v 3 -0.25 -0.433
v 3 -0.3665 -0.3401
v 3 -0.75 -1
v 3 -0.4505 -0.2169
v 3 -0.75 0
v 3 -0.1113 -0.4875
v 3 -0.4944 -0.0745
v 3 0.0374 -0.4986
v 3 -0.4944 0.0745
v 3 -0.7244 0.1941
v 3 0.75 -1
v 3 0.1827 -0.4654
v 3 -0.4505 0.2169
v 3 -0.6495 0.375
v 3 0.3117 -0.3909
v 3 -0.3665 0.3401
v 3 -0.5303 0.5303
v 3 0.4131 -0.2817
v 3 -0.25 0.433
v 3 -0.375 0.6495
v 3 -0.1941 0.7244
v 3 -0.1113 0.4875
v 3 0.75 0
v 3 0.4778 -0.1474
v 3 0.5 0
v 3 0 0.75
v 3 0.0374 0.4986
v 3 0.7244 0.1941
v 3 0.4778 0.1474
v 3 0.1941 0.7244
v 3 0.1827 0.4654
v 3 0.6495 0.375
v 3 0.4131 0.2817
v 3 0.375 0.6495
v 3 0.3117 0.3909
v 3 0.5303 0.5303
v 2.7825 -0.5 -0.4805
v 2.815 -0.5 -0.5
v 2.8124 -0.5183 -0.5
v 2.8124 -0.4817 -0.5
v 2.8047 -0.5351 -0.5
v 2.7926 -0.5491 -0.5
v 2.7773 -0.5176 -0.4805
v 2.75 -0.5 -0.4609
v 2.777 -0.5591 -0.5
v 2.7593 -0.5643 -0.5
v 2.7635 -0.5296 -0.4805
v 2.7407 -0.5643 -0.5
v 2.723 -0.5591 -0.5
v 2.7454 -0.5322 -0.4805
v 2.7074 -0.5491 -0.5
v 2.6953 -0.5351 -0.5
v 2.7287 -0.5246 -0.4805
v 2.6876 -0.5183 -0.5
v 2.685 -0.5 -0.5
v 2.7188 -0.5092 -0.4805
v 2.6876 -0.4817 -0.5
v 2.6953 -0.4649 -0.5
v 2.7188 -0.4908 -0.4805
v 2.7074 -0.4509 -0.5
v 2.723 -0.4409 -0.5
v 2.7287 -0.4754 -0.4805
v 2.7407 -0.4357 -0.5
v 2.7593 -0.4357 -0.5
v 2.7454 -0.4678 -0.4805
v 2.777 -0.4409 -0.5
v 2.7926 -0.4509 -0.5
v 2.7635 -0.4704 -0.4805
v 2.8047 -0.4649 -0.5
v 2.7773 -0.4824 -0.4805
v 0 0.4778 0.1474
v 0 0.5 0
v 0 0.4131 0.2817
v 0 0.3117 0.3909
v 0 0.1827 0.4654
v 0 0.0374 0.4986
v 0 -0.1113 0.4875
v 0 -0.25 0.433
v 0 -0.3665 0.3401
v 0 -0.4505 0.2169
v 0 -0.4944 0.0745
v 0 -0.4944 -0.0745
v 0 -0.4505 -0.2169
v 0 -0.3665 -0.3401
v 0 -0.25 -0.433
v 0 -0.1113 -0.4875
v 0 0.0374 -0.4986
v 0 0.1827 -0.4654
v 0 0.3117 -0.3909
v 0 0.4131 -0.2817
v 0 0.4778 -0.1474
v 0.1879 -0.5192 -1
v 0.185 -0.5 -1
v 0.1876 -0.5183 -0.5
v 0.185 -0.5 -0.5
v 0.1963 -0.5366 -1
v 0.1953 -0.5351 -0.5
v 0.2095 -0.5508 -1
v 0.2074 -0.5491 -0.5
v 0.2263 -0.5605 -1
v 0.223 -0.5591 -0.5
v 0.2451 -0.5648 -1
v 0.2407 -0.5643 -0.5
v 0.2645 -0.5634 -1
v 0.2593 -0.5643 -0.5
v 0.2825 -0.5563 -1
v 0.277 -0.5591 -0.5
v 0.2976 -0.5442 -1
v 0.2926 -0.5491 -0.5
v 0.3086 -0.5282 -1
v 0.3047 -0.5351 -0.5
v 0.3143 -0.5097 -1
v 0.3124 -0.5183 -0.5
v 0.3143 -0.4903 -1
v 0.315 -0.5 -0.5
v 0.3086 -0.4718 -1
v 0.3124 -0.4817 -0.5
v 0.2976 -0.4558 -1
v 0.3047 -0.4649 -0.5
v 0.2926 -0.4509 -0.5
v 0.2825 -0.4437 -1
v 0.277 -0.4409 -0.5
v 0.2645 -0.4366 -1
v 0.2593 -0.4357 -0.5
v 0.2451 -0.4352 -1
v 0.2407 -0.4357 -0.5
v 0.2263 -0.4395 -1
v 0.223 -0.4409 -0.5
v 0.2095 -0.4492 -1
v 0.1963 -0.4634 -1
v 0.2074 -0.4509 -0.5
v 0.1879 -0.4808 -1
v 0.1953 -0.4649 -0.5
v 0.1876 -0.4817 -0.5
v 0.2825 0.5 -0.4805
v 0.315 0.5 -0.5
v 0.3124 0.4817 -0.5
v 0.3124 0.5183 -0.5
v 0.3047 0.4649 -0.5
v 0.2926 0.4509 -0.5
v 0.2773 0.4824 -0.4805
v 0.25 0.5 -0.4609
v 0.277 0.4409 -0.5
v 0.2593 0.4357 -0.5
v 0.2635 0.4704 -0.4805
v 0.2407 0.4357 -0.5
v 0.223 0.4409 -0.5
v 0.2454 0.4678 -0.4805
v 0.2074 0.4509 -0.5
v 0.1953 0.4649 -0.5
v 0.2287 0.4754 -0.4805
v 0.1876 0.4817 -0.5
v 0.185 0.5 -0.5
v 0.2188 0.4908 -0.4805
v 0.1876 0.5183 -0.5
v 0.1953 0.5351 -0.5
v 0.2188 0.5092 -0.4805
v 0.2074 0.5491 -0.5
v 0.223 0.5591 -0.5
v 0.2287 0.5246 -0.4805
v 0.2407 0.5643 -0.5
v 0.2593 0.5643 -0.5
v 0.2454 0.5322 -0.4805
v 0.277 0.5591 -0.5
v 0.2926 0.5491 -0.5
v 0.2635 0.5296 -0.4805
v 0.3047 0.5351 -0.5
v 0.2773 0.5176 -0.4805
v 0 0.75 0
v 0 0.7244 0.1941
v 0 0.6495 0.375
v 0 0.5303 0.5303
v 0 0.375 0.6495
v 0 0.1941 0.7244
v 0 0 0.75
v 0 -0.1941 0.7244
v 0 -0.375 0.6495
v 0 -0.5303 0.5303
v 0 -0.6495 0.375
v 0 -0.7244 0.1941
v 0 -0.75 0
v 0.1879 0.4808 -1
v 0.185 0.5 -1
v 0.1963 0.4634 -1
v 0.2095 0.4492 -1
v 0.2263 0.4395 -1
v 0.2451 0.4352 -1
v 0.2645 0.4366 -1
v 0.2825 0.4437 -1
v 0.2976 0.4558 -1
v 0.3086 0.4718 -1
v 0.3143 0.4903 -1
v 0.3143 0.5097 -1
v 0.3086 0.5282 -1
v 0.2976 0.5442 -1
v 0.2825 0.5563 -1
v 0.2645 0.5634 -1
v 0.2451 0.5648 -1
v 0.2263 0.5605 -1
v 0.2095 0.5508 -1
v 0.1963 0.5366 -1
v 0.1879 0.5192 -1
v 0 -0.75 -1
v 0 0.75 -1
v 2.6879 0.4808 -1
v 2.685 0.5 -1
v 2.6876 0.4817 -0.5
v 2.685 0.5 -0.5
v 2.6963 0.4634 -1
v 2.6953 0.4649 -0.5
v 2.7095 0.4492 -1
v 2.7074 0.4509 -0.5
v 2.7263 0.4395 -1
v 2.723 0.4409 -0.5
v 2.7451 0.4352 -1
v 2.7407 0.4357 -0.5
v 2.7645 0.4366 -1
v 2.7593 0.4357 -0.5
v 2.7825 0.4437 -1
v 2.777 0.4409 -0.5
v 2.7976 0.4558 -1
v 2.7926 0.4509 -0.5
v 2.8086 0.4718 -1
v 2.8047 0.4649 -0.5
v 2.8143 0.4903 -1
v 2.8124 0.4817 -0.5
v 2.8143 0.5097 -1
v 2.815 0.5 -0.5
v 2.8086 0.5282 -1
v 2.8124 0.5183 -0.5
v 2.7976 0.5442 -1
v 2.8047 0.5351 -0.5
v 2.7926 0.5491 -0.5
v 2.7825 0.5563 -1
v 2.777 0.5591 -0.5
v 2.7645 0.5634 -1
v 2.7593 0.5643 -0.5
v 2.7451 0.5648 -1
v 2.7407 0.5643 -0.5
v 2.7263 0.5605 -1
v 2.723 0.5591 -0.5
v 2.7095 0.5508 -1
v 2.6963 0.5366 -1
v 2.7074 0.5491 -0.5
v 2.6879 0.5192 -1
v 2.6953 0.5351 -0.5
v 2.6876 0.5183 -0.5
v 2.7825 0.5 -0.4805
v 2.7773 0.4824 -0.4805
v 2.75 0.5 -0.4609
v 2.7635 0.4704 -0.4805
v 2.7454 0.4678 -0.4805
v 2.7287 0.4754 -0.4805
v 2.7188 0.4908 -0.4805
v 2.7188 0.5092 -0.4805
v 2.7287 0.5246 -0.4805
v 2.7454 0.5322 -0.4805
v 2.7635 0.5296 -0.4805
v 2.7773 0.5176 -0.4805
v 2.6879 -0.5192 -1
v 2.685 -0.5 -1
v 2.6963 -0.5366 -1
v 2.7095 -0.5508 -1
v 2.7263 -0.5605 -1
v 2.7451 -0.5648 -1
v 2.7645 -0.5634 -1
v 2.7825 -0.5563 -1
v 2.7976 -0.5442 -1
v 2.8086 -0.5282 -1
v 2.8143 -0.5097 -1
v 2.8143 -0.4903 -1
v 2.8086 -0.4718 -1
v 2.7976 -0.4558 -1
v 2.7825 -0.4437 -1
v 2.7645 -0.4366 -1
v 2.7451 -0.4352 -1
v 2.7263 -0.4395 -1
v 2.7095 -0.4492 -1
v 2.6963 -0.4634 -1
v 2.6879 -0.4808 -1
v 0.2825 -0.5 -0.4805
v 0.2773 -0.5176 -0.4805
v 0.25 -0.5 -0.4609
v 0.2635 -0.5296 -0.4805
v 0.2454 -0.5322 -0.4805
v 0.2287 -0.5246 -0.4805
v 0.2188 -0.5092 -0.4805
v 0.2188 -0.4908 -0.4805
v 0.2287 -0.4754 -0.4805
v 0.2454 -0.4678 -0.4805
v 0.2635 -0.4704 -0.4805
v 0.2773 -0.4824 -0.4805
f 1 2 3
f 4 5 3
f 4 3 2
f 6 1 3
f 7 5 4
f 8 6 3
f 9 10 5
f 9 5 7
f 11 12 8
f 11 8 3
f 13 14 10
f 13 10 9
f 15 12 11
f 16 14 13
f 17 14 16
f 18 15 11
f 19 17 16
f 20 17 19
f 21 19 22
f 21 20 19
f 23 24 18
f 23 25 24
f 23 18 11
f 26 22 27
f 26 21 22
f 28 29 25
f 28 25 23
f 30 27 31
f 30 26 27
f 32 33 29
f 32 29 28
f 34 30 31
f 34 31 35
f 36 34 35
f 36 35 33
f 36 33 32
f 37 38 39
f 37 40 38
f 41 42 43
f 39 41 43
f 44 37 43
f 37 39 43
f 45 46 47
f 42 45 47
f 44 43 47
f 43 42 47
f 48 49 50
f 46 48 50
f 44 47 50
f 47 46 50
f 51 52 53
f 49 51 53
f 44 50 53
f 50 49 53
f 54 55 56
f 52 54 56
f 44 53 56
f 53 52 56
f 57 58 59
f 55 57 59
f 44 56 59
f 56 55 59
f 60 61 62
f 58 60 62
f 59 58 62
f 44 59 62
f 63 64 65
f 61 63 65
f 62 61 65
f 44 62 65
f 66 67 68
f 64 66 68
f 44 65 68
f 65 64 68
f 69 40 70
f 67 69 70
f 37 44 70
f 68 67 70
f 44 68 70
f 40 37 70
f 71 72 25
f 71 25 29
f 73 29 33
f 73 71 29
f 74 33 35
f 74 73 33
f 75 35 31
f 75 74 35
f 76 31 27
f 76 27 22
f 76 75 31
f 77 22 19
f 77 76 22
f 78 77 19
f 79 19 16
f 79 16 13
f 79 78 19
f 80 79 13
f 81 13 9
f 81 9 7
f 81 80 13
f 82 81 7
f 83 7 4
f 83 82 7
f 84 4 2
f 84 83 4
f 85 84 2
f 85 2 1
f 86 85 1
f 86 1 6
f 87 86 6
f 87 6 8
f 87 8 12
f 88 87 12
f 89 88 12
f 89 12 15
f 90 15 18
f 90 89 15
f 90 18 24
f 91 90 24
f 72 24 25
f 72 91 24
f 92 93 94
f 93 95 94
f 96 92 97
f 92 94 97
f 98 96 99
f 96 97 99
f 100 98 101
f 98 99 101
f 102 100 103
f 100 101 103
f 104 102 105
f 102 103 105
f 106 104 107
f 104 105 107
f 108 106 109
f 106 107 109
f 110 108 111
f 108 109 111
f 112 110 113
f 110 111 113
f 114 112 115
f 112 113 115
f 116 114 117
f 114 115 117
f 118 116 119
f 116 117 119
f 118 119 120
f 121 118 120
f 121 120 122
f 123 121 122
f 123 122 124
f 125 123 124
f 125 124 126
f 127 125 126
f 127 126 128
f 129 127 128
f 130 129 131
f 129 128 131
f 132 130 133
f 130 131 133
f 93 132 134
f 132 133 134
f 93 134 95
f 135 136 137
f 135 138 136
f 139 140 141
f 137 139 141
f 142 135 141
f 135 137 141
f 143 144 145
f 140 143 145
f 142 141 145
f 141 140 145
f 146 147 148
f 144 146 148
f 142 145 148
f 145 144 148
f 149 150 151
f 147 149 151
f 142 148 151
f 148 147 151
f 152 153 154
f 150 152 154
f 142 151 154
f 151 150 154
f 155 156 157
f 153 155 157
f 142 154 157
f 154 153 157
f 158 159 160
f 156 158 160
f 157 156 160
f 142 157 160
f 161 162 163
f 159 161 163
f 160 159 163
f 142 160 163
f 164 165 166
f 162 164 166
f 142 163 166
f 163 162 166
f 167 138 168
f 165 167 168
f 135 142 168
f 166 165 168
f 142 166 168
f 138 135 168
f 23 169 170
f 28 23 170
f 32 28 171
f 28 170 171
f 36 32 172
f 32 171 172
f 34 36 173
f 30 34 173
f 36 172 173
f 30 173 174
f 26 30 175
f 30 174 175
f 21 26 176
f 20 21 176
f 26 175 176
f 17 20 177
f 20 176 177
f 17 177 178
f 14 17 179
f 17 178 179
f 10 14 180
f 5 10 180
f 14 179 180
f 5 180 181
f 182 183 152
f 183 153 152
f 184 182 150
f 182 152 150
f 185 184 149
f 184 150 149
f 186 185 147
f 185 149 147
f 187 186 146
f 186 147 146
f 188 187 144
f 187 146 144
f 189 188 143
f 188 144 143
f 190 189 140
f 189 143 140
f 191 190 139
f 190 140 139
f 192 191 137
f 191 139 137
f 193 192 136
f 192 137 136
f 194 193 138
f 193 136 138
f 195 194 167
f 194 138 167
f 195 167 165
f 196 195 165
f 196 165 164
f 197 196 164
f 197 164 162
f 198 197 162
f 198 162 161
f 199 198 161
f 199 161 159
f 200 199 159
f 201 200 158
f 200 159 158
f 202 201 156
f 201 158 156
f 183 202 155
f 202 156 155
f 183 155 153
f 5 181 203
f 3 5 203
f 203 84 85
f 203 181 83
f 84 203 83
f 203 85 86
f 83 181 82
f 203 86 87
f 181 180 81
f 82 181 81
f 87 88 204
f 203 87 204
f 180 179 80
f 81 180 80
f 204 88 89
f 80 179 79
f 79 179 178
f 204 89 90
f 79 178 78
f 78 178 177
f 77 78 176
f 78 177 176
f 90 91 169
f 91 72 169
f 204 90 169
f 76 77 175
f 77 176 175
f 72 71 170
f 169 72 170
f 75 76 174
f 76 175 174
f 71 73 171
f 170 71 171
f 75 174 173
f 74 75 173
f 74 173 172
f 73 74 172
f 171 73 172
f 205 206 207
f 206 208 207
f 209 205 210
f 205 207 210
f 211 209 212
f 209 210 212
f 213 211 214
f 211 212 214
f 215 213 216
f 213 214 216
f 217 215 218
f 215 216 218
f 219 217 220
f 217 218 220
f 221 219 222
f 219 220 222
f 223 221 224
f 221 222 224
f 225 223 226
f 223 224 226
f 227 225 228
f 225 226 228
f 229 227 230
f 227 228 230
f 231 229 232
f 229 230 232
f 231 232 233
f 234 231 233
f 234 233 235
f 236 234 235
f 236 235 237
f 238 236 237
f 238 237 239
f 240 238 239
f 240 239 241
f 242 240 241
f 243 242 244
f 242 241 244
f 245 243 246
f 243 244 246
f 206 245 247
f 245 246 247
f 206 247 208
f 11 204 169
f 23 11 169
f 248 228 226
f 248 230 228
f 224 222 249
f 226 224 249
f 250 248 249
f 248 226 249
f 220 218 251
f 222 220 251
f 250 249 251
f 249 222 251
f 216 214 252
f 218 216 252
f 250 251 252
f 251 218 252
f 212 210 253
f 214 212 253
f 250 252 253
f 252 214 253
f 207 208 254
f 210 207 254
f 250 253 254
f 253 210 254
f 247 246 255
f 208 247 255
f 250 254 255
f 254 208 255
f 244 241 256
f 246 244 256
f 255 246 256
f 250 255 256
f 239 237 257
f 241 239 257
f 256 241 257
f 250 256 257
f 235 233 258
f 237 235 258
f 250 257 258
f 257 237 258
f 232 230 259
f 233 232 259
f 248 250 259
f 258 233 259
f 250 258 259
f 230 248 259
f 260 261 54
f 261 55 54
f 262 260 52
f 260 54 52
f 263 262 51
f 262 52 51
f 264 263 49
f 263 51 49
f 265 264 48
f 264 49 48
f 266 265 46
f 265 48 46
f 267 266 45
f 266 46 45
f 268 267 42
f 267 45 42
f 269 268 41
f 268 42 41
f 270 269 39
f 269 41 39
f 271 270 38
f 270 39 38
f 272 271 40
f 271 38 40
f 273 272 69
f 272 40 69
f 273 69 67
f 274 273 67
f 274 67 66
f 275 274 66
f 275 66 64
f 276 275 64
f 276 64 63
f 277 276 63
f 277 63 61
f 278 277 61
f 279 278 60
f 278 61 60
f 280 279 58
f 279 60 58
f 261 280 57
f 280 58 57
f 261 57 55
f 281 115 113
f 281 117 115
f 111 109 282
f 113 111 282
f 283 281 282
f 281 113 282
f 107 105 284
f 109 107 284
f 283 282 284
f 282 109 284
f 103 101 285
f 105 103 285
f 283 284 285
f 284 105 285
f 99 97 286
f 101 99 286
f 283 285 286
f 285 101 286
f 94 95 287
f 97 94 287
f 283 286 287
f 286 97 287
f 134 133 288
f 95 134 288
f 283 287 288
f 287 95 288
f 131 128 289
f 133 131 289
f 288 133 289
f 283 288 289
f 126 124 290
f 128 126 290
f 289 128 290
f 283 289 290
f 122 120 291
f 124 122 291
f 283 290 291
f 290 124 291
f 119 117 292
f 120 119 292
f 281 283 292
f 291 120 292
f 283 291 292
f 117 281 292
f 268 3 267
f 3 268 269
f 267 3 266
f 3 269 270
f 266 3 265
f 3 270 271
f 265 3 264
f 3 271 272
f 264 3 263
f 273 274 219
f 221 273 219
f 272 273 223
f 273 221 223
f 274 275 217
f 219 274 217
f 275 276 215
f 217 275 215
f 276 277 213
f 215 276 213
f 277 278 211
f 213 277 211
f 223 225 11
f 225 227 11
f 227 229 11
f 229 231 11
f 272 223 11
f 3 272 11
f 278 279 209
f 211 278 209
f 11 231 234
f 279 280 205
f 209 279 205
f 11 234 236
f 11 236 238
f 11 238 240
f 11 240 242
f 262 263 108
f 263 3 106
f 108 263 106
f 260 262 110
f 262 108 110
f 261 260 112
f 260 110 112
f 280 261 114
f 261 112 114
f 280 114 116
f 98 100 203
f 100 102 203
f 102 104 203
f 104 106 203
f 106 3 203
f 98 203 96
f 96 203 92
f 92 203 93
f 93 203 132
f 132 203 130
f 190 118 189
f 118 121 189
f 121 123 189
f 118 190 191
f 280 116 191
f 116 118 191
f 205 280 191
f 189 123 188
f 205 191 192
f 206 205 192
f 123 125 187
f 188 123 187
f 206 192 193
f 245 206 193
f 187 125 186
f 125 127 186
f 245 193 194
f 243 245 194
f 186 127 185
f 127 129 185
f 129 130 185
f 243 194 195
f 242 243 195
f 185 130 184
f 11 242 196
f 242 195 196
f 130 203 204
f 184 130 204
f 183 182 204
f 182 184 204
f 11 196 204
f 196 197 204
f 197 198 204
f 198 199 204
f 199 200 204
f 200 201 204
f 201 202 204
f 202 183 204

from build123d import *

# Parameters (mm, degrees)
F0_R     = 0.5
F1_DEPTH = 3
F3_D     = 0.13
F3_DEPTH = 0.5
F3_TIP   = 0.0390559402
F4_D     = 0.13
F4_DEPTH = 0.5
F4_TIP   = 0.0390559402


with BuildPart() as f1:
    # F0 (on Right) → F1 (new body)
    with BuildSketch(Plane.YZ):
        with BuildLine():
            Line((0.75, -1), (0.75, 0))
            ThreePointArc((0.75, 0), (0, 0.75), (-0.75, 0))
            Line((-0.75, 0), (-0.75, -1))
            Line((-0.75, -1), (0.75, -1))
        make_face()
        Circle(F0_R, mode=Mode.SUBTRACT)
    extrude(amount=F1_DEPTH)

    # F3
    with Locations(Plane(origin=(0, 0, -1), x_dir=(1, 0, 0), z_dir=(0, 0, -1))):
        with Locations((0.25, 0.5)):
            Hole(F3_D / 2, depth=F3_DEPTH)
            with Locations((0, 0, -(F3_DEPTH + F3_TIP / 2))):  # 118° drill point
                Cone(0, F3_D / 2, F3_TIP, mode=Mode.SUBTRACT)

    # F4
    with Locations(Plane(origin=(0, 0, -1), x_dir=(1, 0, 0), z_dir=(0, 0, -1))):
        with Locations((2.75, 0.5), (2.75, -0.5), (0.25, -0.5)):
            Hole(F4_D / 2, depth=F4_DEPTH)
            with Locations((0, 0, -(F4_DEPTH + F4_TIP / 2))):  # 118° drill point
                Cone(0, F4_D / 2, F4_TIP, mode=Mode.SUBTRACT)


solid = f1.part
